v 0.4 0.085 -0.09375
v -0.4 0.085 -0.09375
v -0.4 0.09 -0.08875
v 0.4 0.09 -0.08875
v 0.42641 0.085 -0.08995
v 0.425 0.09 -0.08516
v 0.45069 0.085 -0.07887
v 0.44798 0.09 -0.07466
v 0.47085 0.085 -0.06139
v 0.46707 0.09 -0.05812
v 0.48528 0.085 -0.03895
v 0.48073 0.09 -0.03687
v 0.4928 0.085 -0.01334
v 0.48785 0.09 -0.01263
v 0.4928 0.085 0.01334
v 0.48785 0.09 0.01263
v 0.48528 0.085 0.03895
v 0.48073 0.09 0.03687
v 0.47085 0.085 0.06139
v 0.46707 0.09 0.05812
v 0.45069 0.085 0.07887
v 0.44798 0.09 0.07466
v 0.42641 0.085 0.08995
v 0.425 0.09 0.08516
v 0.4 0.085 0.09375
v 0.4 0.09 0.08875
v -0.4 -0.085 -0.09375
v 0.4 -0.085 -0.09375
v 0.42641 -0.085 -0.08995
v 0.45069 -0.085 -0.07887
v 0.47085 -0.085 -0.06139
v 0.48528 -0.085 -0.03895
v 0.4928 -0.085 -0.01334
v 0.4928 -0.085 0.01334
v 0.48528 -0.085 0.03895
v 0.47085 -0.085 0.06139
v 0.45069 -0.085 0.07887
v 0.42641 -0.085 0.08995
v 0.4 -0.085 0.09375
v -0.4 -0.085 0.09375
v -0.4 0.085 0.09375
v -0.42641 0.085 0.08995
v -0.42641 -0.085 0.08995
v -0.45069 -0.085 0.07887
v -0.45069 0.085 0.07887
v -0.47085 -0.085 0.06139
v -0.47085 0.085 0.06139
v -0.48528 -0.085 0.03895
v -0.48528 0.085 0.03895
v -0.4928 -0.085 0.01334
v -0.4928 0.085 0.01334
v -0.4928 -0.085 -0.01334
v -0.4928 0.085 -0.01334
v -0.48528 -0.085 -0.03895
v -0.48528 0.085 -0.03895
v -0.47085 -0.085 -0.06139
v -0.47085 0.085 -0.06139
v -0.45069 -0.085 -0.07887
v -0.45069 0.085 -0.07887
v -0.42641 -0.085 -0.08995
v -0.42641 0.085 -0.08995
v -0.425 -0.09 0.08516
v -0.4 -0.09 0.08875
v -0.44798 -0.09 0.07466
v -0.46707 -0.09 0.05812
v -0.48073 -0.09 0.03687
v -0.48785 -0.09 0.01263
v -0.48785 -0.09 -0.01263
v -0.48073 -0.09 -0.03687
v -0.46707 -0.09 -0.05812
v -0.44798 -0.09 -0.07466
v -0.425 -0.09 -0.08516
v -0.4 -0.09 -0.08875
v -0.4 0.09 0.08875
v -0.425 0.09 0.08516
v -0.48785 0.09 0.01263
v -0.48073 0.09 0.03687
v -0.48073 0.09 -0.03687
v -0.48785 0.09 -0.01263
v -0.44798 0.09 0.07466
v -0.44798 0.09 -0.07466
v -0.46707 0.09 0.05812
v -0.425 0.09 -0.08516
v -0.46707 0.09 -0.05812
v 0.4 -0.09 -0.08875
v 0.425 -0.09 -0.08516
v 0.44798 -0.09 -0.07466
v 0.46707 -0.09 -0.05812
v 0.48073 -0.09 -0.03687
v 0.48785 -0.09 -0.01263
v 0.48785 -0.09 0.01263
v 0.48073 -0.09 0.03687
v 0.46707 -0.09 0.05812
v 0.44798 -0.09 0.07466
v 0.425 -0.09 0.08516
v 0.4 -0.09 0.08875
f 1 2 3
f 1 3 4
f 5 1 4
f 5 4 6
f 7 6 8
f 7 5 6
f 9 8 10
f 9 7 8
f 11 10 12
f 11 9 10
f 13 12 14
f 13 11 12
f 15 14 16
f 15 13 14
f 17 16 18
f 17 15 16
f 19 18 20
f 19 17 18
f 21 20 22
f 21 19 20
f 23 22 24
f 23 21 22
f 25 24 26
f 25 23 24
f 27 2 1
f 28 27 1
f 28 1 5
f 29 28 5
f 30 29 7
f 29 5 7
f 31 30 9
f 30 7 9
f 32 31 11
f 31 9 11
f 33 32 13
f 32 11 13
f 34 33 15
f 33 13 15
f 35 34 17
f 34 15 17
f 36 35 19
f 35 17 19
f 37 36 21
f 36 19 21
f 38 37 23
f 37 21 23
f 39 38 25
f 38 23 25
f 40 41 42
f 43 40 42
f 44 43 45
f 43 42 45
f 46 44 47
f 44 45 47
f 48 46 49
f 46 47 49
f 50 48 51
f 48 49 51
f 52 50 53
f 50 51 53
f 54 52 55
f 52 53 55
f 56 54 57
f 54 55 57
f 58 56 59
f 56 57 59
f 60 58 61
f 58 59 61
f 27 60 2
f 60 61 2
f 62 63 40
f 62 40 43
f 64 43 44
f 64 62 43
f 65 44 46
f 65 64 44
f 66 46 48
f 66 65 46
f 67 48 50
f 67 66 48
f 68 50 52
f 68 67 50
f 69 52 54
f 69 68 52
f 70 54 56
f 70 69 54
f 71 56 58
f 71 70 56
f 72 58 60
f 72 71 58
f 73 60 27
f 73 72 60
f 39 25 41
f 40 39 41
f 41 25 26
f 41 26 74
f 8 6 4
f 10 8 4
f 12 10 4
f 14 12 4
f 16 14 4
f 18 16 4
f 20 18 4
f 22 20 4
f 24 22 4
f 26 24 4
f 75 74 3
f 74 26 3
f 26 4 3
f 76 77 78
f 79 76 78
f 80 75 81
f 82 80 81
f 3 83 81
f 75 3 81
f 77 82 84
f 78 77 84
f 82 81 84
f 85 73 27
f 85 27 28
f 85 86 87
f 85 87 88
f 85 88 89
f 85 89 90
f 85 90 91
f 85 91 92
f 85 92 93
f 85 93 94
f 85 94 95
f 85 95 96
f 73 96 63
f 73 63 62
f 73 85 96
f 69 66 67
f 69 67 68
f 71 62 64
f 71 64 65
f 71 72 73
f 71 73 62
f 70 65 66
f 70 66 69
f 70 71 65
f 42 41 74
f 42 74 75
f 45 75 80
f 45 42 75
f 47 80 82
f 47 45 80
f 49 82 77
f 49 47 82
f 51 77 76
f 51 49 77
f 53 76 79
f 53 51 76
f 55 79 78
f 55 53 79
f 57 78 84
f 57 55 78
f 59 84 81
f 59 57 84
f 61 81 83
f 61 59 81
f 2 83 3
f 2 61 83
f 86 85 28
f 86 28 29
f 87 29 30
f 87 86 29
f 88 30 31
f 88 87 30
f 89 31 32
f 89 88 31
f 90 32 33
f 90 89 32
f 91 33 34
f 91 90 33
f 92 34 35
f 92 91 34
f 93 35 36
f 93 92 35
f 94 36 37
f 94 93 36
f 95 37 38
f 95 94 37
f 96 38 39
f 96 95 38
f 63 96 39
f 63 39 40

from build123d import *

# Parameters (mm, degrees)
BOSS_EXTRUDE1_DEPTH = 0.09
CHAMFER1_SIZE       = 0.005


with BuildPart() as part:
    # Sketch1 → Boss-Extrude1 (new body, symmetric)
    with BuildSketch(Plane(origin=(0, 0, 0), x_dir=(1, 0, 0), z_dir=(0, 1, 0))):
        with BuildLine():
            Line((0.4, -0.09375), (-0.4, -0.09375))
            ThreePointArc((-0.4, -0.09375), (-0.49375, 0), (-0.4, 0.09375))
            Line((-0.4, 0.09375), (0.4, 0.09375))
            ThreePointArc((0.4, 0.09375), (0.49375, 0), (0.4, -0.09375))
        make_face()
    extrude(amount=BOSS_EXTRUDE1_DEPTH, both=True)

    # Chamfer1
    chamfer1_edges = [part.edges().sort_by_distance(p)[0] for p in [
        (-0.49375, 0.09, 0),
        (0, 0.09, 0.09375),
        (0.49375, 0.09, 0),
        (0, -0.09, 0.09375),
        (-0.49375, -0.09, 0),
        (0, -0.09, -0.09375),
        (0.49375, -0.09, 0),
        (0, 0.09, -0.09375),
    ]]
    chamfer(chamfer1_edges, length=CHAMFER1_SIZE)


solid = part.part
